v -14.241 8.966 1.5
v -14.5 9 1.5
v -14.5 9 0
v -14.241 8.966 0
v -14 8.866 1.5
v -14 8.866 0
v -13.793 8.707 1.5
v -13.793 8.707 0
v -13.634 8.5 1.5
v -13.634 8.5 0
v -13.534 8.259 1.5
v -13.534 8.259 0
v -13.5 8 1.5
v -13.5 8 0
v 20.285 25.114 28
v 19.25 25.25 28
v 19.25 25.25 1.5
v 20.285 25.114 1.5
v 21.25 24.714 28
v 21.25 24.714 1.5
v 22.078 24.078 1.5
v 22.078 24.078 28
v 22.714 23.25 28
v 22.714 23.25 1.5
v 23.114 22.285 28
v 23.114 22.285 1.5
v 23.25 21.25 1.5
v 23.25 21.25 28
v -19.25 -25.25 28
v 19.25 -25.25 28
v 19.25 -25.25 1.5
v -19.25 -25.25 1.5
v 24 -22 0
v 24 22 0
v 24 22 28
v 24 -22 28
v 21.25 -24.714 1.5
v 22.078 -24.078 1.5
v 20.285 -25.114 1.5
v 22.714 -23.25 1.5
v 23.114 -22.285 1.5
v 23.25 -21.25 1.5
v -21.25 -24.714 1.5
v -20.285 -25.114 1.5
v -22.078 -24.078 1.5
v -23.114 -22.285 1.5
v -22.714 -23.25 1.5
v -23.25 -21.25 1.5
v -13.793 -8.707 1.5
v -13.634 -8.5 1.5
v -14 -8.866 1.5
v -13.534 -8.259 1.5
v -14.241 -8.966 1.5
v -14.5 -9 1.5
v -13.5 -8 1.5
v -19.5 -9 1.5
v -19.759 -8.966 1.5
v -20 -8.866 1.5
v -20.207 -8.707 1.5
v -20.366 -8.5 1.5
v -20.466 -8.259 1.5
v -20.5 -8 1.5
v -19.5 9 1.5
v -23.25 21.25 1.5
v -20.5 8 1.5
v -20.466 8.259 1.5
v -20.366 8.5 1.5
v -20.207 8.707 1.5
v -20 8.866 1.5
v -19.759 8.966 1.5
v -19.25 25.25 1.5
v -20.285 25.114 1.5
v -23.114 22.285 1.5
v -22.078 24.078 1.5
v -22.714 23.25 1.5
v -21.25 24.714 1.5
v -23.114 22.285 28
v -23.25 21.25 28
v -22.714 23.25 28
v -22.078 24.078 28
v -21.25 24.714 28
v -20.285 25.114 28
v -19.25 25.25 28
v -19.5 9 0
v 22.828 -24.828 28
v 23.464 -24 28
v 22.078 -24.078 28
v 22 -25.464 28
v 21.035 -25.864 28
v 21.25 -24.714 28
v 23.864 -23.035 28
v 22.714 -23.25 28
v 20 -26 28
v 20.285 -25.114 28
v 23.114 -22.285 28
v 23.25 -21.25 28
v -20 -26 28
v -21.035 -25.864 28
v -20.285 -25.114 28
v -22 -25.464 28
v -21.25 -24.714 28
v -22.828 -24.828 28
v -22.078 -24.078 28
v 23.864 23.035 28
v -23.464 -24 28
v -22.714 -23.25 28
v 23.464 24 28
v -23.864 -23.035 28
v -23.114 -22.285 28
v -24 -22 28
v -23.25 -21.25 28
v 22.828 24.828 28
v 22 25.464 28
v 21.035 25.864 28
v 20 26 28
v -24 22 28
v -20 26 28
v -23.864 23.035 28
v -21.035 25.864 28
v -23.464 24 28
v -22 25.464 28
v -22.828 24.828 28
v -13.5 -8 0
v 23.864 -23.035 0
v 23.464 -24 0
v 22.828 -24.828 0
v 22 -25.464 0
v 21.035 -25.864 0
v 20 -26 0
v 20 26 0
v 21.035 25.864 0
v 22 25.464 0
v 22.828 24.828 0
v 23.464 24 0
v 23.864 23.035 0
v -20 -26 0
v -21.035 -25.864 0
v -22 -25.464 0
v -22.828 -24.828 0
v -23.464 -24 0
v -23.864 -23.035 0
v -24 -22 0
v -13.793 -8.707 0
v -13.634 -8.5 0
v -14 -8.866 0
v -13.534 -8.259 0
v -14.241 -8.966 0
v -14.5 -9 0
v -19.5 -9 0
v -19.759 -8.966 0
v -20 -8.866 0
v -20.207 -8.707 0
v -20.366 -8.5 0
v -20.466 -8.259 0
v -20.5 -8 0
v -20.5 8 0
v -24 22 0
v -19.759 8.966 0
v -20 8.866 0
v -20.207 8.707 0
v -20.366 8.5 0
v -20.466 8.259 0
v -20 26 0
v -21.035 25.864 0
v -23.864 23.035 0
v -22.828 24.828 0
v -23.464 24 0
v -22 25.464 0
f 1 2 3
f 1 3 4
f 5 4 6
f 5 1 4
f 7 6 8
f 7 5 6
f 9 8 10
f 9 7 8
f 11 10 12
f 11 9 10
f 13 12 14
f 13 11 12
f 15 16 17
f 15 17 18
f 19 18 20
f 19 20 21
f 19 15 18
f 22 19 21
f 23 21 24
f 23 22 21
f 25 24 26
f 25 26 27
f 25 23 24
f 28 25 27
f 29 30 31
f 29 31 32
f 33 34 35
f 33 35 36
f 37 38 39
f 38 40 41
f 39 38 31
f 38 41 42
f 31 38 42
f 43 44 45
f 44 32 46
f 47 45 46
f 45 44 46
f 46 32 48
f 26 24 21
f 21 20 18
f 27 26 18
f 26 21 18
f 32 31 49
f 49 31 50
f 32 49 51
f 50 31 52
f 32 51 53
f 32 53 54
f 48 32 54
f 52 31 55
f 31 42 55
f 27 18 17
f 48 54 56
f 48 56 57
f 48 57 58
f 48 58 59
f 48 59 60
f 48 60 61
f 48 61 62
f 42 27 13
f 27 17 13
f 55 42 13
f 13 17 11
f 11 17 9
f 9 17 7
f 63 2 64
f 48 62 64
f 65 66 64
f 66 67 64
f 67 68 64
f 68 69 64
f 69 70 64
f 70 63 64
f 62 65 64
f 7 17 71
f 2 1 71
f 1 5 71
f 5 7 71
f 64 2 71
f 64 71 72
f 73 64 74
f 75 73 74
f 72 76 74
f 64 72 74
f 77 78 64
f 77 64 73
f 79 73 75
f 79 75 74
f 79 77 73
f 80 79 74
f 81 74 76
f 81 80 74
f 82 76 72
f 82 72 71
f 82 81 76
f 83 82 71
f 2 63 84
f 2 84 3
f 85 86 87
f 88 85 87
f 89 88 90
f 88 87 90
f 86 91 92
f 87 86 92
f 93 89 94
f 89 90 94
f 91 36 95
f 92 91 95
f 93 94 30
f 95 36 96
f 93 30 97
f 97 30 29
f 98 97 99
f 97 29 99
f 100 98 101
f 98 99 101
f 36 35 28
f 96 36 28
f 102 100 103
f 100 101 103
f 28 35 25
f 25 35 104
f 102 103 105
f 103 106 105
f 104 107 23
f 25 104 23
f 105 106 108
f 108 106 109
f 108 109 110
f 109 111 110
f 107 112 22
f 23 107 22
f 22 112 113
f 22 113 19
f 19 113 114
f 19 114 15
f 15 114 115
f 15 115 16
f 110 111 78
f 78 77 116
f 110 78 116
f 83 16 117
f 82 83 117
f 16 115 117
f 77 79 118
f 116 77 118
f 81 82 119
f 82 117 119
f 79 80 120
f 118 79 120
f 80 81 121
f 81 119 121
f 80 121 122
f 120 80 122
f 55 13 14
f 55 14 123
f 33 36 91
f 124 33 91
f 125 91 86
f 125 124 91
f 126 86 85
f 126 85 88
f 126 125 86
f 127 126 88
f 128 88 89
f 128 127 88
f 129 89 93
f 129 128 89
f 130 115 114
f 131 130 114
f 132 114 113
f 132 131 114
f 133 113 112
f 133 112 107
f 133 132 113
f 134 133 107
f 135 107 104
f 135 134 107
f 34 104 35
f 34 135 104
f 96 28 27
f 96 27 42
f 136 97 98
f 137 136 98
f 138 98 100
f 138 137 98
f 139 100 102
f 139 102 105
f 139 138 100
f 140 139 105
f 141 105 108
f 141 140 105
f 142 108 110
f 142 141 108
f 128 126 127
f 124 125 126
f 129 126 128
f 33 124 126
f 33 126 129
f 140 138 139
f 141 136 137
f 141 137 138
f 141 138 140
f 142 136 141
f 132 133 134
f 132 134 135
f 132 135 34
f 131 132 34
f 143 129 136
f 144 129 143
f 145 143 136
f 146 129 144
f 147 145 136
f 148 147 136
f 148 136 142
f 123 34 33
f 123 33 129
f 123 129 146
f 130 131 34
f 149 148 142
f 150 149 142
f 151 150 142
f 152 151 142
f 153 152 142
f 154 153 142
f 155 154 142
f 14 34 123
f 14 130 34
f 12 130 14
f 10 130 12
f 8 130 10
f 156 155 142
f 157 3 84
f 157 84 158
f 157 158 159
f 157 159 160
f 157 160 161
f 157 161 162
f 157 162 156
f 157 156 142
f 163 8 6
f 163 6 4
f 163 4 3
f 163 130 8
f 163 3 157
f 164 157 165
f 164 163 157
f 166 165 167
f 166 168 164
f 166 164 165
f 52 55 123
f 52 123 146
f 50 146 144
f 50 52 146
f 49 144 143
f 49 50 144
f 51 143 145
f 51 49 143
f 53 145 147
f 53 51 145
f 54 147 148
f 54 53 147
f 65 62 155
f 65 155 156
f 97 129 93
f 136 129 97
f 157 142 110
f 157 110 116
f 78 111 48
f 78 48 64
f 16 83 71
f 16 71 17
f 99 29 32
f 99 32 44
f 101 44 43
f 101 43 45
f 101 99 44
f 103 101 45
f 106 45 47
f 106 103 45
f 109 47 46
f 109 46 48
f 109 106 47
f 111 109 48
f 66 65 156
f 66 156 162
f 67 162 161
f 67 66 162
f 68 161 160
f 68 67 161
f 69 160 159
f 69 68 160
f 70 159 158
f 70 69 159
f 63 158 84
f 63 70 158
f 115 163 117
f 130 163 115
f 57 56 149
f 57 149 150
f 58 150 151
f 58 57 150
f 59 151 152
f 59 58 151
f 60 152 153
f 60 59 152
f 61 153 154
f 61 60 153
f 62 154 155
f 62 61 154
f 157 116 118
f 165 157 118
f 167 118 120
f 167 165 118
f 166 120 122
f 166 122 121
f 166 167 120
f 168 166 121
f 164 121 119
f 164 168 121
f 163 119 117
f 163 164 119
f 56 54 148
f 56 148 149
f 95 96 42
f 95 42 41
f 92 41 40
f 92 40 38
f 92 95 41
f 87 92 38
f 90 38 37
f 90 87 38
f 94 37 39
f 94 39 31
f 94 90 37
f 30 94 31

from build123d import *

# Parameters (mm, degrees)
BOSS_EXTRUDE1_DEPTH = 28
CUT_EXTRUDE1_DEPTH  = 26.5
CUT_EXTRUDE2_DEPTH  = 2.5


with BuildPart() as part:
    # Sketch1 → Boss-Extrude1 (new body)
    with BuildSketch(Plane.XY):
        with BuildLine():
            Line((-20, 26), (20, 26))
            ThreePointArc((20, 26), (22.828427125, 24.828427125), (24, 22))
            Line((24, 22), (24, -22))
            ThreePointArc((24, -22), (22.828427125, -24.828427125), (20, -26))
            Line((20, -26), (-20, -26))
            ThreePointArc((-20, -26), (-22.828427125, -24.828427125), (-24, -22))
            Line((-24, -22), (-24, 22))
            ThreePointArc((-24, 22), (-22.828427125, 24.828427125), (-20, 26))
        make_face()
    extrude(amount=BOSS_EXTRUDE1_DEPTH)

    # Sketch2 → Cut-Extrude1 (cut)
    with BuildSketch(Plane.XY.offset(28)):
        with BuildLine():
            Line((-19.25, 25.25), (19.25, 25.25))
            ThreePointArc((19.25, 25.25), (22.078427125, 24.078427125), (23.25, 21.25))
            Line((23.25, 21.25), (23.25, -21.25))
            ThreePointArc((23.25, -21.25), (22.078427125, -24.078427125), (19.25, -25.25))
            Line((19.25, -25.25), (-19.25, -25.25))
            ThreePointArc((-19.25, -25.25), (-22.078427125, -24.078427125), (-23.25, -21.25))
            Line((-23.25, -21.25), (-23.25, 21.25))
            ThreePointArc((-23.25, 21.25), (-22.078427125, 24.078427125), (-19.25, 25.25))
        make_face()
    extrude(amount=-CUT_EXTRUDE1_DEPTH, mode=Mode.SUBTRACT)

    # Sketch3 → Cut-Extrude2 (cut, through all)
    with BuildSketch(Plane.XY.offset(1.5)):
        with BuildLine():
            Line((-19.5, 9), (-14.5, 9))
            ThreePointArc((-14.5, 9), (-13.792893219, 8.707106781), (-13.5, 8))
            Line((-13.5, 8), (-13.5, -8))
            ThreePointArc((-13.5, -8), (-13.792893219, -8.707106781), (-14.5, -9))
            Line((-14.5, -9), (-19.5, -9))
            ThreePointArc((-19.5, -9), (-20.207106781, -8.707106781), (-20.5, -8))
            Line((-20.5, -8), (-20.5, 8))
            ThreePointArc((-20.5, 8), (-20.207106781, 8.707106781), (-19.5, 9))
        make_face()
    extrude(amount=-CUT_EXTRUDE2_DEPTH, mode=Mode.SUBTRACT)


solid = part.part
